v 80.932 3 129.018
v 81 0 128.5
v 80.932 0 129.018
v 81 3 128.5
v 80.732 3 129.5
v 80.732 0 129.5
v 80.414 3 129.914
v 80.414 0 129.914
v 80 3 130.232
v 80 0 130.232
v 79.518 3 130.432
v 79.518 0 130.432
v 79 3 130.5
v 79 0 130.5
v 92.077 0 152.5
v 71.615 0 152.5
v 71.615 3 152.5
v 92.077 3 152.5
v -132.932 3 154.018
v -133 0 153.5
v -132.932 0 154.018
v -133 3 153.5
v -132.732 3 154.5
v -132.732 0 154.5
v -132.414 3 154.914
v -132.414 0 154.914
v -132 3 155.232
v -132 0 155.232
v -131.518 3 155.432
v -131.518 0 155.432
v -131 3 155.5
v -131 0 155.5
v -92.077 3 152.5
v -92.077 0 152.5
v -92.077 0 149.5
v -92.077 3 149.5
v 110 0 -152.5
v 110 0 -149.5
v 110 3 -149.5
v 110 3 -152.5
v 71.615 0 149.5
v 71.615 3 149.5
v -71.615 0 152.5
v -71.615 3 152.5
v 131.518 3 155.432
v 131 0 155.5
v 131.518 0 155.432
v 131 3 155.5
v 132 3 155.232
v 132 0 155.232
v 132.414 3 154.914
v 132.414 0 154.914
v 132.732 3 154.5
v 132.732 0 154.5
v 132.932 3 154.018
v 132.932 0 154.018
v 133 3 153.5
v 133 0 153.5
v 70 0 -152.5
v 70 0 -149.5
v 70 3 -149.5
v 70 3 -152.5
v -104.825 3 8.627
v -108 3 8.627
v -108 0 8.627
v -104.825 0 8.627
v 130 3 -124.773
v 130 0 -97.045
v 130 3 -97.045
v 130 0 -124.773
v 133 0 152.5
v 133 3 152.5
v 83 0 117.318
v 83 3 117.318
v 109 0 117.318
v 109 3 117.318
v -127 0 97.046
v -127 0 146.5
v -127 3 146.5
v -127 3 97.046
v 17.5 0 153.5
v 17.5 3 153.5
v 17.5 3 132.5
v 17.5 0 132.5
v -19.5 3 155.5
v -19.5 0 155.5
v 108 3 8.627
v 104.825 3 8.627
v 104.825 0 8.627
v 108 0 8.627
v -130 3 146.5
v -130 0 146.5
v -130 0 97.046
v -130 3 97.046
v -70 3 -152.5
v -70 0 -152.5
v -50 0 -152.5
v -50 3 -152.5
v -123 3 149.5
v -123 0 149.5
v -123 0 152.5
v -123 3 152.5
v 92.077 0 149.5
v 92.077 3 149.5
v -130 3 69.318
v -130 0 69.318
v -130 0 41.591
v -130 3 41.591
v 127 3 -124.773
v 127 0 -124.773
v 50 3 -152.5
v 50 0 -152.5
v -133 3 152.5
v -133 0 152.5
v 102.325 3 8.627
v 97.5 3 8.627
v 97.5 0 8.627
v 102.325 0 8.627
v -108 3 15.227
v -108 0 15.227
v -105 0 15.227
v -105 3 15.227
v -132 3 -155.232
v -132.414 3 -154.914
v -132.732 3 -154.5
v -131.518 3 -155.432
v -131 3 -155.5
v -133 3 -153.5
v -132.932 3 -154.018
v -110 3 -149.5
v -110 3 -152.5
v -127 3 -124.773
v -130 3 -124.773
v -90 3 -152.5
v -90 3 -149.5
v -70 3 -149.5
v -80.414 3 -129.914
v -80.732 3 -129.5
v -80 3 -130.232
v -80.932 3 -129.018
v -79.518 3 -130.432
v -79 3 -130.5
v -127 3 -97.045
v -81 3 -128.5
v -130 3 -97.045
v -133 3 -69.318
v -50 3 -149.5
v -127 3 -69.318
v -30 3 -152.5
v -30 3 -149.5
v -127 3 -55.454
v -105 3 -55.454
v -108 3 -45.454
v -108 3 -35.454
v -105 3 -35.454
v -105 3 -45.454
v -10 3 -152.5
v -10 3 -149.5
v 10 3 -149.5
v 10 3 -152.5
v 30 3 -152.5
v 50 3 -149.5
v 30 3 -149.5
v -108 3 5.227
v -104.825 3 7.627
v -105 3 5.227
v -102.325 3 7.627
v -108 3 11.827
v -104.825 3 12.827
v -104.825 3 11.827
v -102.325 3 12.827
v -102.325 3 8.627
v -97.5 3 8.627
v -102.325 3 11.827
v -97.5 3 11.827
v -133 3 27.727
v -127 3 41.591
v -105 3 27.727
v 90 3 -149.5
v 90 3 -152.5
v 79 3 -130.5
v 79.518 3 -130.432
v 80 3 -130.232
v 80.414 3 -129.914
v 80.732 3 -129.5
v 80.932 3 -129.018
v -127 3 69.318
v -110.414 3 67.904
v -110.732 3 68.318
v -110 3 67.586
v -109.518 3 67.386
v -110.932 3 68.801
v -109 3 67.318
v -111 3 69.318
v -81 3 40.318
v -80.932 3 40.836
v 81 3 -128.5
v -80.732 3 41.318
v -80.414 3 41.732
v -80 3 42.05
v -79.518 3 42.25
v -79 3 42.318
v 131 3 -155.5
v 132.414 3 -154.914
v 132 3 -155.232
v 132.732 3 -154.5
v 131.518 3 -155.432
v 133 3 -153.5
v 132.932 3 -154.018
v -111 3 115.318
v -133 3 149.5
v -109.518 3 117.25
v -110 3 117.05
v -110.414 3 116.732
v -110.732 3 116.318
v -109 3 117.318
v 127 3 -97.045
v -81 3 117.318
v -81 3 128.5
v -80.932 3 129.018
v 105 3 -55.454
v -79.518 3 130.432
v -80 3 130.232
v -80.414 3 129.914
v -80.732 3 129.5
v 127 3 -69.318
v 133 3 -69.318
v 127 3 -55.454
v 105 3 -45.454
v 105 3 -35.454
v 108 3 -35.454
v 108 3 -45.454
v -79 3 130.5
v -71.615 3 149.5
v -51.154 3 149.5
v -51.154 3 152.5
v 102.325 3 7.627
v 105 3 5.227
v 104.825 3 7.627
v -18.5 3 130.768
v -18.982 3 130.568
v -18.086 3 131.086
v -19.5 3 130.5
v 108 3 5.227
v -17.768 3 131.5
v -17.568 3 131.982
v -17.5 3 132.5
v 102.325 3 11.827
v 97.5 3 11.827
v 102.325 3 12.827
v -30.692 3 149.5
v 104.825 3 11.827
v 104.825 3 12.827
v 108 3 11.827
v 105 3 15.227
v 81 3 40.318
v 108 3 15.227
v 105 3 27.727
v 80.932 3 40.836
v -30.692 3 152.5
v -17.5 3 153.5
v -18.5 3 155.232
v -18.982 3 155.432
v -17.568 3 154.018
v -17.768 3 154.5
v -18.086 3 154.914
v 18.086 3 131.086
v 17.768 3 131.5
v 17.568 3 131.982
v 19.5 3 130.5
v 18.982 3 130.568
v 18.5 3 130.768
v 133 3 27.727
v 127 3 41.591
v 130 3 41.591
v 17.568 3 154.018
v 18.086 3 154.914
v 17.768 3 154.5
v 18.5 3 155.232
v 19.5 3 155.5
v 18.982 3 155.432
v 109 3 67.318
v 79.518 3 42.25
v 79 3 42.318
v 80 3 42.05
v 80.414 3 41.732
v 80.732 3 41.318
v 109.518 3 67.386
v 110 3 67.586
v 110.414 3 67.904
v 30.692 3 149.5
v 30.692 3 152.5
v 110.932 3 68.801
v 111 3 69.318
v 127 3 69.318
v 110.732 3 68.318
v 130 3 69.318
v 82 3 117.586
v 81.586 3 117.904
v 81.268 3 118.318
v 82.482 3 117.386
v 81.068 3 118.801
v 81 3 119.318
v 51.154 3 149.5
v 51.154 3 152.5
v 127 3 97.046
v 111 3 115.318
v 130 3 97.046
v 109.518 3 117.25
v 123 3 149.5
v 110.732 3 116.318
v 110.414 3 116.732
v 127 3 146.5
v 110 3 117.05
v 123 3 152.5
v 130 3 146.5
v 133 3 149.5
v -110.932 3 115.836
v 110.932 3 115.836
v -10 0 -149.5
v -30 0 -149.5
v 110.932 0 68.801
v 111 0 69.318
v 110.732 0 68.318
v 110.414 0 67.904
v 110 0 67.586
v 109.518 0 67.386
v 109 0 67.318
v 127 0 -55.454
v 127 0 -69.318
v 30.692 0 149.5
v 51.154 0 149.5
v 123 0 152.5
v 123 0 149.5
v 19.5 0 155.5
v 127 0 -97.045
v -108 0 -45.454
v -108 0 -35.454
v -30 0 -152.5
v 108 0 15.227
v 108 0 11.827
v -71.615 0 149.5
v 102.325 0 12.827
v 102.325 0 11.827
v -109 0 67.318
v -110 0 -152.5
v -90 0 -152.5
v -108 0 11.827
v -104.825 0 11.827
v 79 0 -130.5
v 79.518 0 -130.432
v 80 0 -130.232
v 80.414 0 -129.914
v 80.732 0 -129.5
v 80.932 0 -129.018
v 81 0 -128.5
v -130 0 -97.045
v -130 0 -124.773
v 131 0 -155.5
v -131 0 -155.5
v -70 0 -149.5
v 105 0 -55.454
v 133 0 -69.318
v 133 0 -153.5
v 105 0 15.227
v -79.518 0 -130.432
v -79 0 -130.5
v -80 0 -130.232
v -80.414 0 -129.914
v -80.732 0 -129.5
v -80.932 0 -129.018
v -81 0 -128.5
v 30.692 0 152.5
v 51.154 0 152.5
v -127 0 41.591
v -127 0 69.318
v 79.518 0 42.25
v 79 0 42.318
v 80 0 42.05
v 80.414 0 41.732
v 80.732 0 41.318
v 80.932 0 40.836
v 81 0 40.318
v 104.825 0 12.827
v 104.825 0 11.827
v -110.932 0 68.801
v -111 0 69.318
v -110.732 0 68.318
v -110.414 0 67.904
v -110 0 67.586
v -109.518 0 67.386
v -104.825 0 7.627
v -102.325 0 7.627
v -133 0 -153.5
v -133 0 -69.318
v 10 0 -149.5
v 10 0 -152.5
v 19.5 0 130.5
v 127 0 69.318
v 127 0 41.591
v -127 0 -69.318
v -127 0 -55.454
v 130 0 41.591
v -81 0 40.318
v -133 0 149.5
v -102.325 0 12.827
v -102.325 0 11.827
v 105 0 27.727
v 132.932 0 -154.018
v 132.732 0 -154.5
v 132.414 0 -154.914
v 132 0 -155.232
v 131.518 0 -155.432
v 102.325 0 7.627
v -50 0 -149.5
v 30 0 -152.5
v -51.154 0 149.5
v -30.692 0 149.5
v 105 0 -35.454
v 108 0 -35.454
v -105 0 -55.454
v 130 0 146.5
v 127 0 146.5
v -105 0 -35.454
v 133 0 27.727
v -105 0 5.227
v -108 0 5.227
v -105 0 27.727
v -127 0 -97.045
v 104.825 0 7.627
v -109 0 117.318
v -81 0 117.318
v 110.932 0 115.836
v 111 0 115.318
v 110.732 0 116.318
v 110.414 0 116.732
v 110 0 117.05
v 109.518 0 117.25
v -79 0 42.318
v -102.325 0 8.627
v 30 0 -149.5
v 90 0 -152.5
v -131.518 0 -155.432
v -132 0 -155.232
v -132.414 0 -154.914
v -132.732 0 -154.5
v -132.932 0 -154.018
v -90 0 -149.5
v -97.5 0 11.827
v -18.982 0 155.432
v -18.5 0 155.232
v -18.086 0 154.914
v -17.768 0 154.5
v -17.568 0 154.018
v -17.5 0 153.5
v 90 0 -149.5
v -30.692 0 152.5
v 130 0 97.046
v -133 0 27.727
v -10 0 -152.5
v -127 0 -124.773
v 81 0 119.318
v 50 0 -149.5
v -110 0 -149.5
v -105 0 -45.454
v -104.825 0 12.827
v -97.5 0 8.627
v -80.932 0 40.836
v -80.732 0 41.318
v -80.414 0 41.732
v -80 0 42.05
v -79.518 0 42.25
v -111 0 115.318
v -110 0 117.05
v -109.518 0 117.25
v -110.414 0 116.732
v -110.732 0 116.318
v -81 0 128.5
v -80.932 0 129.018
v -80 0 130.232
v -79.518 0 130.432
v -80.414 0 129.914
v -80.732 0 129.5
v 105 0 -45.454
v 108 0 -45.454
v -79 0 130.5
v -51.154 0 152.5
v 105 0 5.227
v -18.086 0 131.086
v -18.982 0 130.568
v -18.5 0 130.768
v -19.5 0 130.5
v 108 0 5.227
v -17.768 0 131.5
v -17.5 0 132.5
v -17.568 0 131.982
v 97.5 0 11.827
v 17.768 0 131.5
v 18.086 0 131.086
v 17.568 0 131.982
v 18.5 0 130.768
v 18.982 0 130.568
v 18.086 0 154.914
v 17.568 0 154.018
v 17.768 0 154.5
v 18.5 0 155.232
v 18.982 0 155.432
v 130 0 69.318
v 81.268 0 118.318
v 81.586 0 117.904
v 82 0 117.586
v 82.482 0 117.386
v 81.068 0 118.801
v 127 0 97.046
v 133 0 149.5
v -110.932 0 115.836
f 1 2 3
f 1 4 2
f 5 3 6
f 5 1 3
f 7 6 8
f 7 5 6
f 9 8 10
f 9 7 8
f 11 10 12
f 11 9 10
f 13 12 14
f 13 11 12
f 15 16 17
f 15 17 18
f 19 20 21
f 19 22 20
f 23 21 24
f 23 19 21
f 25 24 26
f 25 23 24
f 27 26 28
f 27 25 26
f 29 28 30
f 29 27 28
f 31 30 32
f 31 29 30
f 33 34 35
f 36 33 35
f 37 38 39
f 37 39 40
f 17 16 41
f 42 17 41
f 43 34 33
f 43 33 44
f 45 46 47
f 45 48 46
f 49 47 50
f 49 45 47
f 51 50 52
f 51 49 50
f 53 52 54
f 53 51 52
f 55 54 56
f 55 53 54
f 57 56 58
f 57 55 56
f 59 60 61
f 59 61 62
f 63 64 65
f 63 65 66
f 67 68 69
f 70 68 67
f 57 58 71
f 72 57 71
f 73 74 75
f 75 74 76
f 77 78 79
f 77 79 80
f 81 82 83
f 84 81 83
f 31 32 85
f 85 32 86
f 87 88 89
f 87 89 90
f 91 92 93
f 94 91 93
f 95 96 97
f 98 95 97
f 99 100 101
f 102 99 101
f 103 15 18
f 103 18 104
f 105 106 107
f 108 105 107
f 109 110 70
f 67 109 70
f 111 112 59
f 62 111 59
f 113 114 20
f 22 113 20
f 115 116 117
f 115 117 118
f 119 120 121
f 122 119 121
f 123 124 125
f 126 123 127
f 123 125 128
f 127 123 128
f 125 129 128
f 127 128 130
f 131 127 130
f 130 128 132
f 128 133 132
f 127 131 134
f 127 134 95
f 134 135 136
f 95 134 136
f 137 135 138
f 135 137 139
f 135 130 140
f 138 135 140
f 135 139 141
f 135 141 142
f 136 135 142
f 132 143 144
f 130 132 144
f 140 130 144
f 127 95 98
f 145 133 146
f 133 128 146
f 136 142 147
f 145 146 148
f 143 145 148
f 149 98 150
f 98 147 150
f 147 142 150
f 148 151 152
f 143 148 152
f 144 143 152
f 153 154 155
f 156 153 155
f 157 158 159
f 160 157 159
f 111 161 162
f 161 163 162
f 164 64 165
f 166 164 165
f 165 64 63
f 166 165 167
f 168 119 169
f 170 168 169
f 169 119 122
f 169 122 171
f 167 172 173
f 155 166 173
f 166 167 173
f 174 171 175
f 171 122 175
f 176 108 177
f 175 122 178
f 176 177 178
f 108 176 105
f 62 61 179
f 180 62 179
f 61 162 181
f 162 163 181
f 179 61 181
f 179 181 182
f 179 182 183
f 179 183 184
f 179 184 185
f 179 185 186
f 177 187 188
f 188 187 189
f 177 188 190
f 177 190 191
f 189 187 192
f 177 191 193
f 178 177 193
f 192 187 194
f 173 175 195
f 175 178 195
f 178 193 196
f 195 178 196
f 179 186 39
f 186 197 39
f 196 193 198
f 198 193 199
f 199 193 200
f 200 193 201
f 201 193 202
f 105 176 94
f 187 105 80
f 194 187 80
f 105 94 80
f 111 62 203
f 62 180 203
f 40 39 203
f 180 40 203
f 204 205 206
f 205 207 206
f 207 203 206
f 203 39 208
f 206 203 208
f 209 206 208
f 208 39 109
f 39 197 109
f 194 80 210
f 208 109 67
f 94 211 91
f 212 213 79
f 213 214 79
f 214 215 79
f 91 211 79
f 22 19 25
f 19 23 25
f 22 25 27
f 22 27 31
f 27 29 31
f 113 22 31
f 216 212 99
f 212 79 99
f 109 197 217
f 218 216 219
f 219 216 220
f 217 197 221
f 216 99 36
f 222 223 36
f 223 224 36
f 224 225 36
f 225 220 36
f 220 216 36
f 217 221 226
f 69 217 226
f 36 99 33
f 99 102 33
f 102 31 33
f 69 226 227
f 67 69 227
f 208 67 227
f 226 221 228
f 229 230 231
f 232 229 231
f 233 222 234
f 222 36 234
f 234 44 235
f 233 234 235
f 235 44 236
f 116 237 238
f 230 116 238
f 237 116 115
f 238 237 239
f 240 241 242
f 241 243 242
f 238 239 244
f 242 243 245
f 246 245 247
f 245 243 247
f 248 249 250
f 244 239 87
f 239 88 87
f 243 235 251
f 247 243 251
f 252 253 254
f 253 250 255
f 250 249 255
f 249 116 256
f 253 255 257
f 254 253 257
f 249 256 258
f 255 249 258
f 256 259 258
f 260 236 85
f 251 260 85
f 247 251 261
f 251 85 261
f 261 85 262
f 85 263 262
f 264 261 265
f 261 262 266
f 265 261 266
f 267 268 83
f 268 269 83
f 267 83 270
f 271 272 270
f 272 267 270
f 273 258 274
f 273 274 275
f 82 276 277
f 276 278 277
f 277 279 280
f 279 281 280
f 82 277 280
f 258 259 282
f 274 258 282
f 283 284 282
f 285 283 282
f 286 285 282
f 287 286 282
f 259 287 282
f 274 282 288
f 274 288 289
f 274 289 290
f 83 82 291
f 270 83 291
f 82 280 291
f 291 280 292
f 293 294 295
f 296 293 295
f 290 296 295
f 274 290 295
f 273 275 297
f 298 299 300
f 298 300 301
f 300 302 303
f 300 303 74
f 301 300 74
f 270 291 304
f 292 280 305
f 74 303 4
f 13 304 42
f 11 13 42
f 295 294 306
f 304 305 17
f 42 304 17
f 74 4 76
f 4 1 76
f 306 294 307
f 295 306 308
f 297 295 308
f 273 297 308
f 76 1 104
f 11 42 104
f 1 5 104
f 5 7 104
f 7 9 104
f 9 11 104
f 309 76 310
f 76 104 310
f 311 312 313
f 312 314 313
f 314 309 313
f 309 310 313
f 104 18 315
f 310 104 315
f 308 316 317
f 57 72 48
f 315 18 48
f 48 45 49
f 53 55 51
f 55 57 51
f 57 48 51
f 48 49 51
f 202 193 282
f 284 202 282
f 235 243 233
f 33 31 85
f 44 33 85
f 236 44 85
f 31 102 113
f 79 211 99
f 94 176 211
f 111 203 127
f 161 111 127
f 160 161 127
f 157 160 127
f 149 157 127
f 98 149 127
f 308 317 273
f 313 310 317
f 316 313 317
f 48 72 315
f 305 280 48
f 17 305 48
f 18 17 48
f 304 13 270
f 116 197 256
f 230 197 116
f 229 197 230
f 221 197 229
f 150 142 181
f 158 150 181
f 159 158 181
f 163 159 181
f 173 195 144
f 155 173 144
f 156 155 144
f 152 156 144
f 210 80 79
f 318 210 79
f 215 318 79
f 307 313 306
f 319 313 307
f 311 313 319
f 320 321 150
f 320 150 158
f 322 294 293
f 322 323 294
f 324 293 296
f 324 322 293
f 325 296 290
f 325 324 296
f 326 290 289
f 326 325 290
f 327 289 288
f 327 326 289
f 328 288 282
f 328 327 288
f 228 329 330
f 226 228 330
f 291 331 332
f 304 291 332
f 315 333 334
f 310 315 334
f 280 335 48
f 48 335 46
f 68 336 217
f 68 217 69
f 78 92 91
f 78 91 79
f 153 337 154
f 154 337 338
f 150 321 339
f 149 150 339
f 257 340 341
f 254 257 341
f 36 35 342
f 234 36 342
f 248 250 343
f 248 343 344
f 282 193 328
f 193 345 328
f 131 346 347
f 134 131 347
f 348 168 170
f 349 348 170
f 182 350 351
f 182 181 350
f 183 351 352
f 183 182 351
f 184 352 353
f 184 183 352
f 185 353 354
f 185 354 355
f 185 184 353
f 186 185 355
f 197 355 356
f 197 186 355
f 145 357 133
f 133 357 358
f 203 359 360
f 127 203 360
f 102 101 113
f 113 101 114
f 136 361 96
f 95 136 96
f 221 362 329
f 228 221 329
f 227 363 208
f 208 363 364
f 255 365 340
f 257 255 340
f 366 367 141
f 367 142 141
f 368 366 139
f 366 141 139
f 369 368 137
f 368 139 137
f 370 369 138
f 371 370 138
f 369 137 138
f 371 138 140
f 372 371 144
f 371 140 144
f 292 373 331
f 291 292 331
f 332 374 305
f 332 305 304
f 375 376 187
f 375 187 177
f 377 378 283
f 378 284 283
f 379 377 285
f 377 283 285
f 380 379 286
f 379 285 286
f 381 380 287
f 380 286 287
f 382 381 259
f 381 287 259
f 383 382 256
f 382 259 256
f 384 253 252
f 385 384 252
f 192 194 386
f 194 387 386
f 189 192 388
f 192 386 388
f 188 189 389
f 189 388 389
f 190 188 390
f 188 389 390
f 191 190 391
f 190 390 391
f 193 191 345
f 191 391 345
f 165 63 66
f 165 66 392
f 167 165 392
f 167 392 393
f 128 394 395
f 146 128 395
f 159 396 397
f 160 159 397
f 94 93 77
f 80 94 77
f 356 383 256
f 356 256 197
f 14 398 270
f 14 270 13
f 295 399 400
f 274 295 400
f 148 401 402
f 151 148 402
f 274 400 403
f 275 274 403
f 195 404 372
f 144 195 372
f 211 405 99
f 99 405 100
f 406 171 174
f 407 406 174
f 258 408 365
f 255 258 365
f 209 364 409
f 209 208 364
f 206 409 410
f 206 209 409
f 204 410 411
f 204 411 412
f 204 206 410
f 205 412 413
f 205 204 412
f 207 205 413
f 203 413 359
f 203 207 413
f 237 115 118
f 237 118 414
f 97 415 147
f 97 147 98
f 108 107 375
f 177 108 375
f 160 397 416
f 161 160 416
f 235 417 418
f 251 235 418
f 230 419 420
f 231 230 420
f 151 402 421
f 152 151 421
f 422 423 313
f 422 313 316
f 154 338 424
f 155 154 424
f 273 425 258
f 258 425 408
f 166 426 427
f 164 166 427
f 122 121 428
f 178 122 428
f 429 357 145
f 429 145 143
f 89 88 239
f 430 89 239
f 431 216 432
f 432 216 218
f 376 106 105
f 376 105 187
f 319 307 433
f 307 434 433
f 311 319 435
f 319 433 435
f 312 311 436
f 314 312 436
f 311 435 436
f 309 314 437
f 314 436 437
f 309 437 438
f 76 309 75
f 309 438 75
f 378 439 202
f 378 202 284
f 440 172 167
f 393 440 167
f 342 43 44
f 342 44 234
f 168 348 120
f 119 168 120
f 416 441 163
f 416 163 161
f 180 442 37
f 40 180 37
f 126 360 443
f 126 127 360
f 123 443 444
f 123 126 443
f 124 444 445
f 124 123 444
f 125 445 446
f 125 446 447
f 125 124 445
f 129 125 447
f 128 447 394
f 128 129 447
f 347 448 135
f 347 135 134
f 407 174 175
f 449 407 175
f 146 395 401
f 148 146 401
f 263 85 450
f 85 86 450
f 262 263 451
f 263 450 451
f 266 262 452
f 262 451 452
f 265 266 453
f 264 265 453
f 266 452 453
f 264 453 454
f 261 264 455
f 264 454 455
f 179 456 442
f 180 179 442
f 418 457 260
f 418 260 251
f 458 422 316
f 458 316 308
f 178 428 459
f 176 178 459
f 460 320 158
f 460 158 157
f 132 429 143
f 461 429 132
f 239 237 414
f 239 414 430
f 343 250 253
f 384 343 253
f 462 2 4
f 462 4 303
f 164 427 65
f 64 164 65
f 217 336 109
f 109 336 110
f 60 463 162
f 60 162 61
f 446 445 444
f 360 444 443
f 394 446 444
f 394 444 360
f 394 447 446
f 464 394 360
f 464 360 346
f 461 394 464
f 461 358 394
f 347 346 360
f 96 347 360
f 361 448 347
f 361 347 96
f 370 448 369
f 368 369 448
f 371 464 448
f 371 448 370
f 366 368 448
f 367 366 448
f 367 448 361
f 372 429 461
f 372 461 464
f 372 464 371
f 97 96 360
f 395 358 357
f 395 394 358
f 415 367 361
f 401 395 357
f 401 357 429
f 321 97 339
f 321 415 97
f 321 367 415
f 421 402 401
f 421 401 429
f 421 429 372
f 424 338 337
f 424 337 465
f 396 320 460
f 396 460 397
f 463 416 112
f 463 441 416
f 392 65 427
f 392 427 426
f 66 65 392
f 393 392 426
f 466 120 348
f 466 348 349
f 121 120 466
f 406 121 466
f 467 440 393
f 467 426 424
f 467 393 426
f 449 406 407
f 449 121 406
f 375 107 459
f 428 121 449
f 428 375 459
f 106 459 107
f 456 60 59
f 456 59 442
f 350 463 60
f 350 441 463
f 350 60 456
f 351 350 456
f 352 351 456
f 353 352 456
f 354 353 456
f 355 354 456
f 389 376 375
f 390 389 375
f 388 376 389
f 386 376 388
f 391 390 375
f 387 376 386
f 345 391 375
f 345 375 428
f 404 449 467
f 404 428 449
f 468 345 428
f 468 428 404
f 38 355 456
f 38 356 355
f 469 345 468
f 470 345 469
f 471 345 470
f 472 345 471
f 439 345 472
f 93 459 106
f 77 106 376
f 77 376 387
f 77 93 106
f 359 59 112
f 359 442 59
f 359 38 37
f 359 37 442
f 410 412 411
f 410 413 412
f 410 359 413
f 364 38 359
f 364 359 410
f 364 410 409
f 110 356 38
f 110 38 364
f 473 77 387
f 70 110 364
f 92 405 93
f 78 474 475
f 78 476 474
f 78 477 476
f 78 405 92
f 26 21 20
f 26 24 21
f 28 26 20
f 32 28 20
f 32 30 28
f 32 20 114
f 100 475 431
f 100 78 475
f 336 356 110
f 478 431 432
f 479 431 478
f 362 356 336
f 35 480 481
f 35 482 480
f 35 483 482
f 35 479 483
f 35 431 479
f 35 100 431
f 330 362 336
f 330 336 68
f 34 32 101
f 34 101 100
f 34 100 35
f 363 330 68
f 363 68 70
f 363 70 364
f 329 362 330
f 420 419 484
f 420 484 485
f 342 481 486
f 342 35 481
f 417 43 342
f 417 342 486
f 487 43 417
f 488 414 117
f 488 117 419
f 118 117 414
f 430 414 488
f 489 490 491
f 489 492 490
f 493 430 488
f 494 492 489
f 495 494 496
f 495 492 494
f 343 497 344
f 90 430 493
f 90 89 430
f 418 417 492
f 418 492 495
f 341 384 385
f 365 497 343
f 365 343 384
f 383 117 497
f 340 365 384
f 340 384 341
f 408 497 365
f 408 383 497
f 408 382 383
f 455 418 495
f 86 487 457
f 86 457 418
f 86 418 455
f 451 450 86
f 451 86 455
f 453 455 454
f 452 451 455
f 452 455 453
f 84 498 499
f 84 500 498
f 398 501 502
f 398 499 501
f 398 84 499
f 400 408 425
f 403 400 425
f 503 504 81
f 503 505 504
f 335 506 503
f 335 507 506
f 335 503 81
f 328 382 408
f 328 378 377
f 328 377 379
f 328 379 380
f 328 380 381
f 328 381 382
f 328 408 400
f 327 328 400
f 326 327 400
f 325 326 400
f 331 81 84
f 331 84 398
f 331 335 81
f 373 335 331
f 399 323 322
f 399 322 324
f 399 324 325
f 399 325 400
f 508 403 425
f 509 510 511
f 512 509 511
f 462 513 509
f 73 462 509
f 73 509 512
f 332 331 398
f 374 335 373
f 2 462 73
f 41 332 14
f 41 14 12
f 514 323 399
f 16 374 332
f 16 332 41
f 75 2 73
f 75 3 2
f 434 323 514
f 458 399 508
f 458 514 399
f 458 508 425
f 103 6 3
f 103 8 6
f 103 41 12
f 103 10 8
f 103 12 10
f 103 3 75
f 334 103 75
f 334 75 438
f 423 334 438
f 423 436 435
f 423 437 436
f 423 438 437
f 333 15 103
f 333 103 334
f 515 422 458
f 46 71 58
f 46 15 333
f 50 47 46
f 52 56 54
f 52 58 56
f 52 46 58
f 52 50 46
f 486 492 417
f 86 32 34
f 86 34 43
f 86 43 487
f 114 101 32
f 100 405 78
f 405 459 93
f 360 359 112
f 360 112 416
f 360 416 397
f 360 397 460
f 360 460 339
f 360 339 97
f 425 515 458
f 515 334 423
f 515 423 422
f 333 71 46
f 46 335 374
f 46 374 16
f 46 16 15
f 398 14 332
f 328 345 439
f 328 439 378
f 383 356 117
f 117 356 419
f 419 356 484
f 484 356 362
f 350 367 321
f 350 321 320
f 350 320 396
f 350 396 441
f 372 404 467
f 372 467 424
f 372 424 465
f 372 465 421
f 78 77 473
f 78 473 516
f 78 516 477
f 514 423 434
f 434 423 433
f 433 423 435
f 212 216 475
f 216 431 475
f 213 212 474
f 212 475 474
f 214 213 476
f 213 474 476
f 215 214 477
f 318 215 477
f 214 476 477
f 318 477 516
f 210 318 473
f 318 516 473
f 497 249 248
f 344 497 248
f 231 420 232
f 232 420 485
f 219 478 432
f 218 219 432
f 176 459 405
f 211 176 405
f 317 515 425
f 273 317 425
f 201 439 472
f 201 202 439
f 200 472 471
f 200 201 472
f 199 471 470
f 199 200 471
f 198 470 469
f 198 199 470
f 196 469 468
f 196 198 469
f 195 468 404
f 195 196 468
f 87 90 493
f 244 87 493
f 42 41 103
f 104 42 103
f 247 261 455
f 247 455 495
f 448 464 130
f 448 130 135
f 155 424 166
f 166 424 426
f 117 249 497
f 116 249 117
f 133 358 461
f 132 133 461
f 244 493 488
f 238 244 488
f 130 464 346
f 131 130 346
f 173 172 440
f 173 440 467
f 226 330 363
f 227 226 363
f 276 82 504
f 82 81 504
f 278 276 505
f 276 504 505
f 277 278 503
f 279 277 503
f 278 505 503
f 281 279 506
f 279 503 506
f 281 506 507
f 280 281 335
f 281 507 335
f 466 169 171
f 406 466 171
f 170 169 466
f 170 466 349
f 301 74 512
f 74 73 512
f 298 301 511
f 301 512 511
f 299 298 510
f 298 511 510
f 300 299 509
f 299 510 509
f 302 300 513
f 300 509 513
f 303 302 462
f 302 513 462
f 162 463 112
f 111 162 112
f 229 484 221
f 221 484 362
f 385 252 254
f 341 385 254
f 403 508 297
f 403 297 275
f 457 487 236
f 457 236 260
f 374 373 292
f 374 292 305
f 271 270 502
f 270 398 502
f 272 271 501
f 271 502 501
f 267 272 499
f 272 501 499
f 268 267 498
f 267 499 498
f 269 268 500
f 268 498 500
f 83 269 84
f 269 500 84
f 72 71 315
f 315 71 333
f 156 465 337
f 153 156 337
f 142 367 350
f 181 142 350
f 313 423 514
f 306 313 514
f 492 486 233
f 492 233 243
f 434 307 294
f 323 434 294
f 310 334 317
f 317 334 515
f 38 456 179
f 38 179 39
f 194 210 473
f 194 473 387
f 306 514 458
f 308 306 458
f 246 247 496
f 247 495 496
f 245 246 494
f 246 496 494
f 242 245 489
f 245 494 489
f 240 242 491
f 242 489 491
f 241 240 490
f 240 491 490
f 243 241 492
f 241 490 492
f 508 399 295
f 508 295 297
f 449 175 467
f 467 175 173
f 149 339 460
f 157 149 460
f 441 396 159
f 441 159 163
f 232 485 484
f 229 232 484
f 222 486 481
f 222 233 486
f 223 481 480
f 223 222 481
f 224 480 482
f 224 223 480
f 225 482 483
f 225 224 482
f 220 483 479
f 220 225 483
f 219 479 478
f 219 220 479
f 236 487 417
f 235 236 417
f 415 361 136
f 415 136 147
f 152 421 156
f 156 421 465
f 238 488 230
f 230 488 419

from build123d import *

# Parameters (mm, degrees)
SKETCH1_W               = 3
SKETCH1_H               = 49.4545
SKETCH1_W_2             = 20.4615
SKETCH1_H_2             = 3
SKETCH1_H_3             = 27.7273
SKETCH1_W_3             = 162
SKETCH1_H_4             = 261
SKETCH1_W_4             = 20
BOSS_EXTRUDE1_DEPTH     = 3
SKETCH2_W               = 10.5
SKETCH2_H               = 3.2
SKETCH2_W_2             = 2.5
SKETCH2_H_2             = 5.2
CUT_EXTRUDE1_DEPTH      = 10
SKETCH3_W               = 35
SKETCH3_H               = 25
SKETCH3_W_2             = 30
SKETCH3_H_2             = 50
CUT_EXTRUDE2_DEPTH      = 1
CUT_EXTRUDE2_DEPTH_BACK = 4
SKETCH4_W               = 162
SKETCH4_H               = 25
BOSS_EXTRUDE2_DEPTH     = 3
FILLET1_R               = 2


with BuildPart() as part:
    # Sketch1 → Boss-Extrude1 (new body)
    with BuildSketch(Plane(origin=(0, 0, 0), x_dir=(1, 0, 0), z_dir=(0, 1, 0))):
        Polygon((-133, -152.5), (-133, -155.5), (133, -155.5), (133, -152.5), (123, -152.5), (123, -149.5), (133, -149.5), (133, -27.7273), (105, -27.7273), (105, -15.2273), (108, -15.2273), (108, -5.2273), (105, -5.2273), (105, 35.4545), (108, 35.4545), (108, 45.4545), (105, 45.4545), (105, 55.4545), (127, 55.4545), (127, 69.3181), (133, 69.3181), (133, 155.5), (-133, 155.5), (-133, 69.3181), (-127, 69.3181), (-127, 55.4545), (-105, 55.4545), (-105, 45.4545), (-108, 45.4545), (-108, 35.4545), (-105, 35.4545), (-105, -5.2273), (-108, -5.2273), (-108, -15.2273), (-105, -15.2273), (-105, -27.7273), (-133, -27.7273), (-133, -149.5), (-123, -149.5), (-123, -152.5), align=None)
        with Locations((-128.5, -121.77275)):
            Rectangle(SKETCH1_W, SKETCH1_H, mode=Mode.SUBTRACT)
        with Locations((-81.846, -151)):
            Rectangle(SKETCH1_W_2, SKETCH1_H_2, mode=Mode.SUBTRACT)
        with Locations((-40.923, -151)):
            Rectangle(SKETCH1_W_2, SKETCH1_H_2, mode=Mode.SUBTRACT)
        with Locations((0, -151)):
            Rectangle(SKETCH1_W_2, SKETCH1_H_2, mode=Mode.SUBTRACT)
        with Locations((-128.5, -55.45455)):
            Rectangle(SKETCH1_W, SKETCH1_H_3, mode=Mode.SUBTRACT)
        with Locations((40.923, -151)):
            Rectangle(SKETCH1_W_2, SKETCH1_H_2, mode=Mode.SUBTRACT)
        with Locations((81.846, -151)):
            Rectangle(SKETCH1_W_2, SKETCH1_H_2, mode=Mode.SUBTRACT)
        with Locations((128.5, -121.77275)):
            Rectangle(SKETCH1_W, SKETCH1_H, mode=Mode.SUBTRACT)
        with Locations((128.5, -55.45455)):
            Rectangle(SKETCH1_W, SKETCH1_H_3, mode=Mode.SUBTRACT)
        Rectangle(SKETCH1_W_3, SKETCH1_H_4, mode=Mode.SUBTRACT)
        with Locations((-128.5, 110.90905)):
            Rectangle(SKETCH1_W, SKETCH1_H_3, mode=Mode.SUBTRACT)
        with Locations((-100, 151)):
            Rectangle(SKETCH1_W_4, SKETCH1_H_2, mode=Mode.SUBTRACT)
        with Locations((-60, 151)):
            Rectangle(SKETCH1_W_4, SKETCH1_H_2, mode=Mode.SUBTRACT)
        with Locations((-20, 151)):
            Rectangle(SKETCH1_W_4, SKETCH1_H_2, mode=Mode.SUBTRACT)
        with Locations((20, 151)):
            Rectangle(SKETCH1_W_4, SKETCH1_H_2, mode=Mode.SUBTRACT)
        with Locations((60, 151)):
            Rectangle(SKETCH1_W_4, SKETCH1_H_2, mode=Mode.SUBTRACT)
        with Locations((128.5, 110.90905)):
            Rectangle(SKETCH1_W, SKETCH1_H_3, mode=Mode.SUBTRACT)
        with Locations((100, 151)):
            Rectangle(SKETCH1_W_4, SKETCH1_H_2, mode=Mode.SUBTRACT)
    extrude(amount=BOSS_EXTRUDE1_DEPTH)

    # Sketch2 → Cut-Extrude1 (cut)
    with BuildSketch(Plane(origin=(0, 3, 0), x_dir=(1, 0, 0), z_dir=(0, 1, 0))):
        with Locations((-102.75, -10.2273)):
            Rectangle(SKETCH2_W, SKETCH2_H)
        with Locations((102.75, -10.2273)):
            Rectangle(SKETCH2_W, SKETCH2_H)
        with Locations((103.575, -10.2273)):
            Rectangle(SKETCH2_W_2, SKETCH2_H_2)
        with Locations((-103.575, -10.2273)):
            Rectangle(SKETCH2_W_2, SKETCH2_H_2)
    extrude(amount=-CUT_EXTRUDE1_DEPTH, mode=Mode.SUBTRACT)

    # Sketch3 → Cut-Extrude2 (cut, two sides)
    with BuildSketch(Plane(origin=(0, 3, 0), x_dir=(1, 0, 0), z_dir=(0, 1, 0))) as cut_extrude2_sk:
        with Locations((0, -143)):
            Rectangle(SKETCH3_W, SKETCH3_H)
        with Locations((-96, -92.3182)):
            Rectangle(SKETCH3_W_2, SKETCH3_H_2)
        with Locations((96, -92.3182)):
            Rectangle(SKETCH3_W_2, SKETCH3_H_2)
    extrude(amount=CUT_EXTRUDE2_DEPTH, mode=Mode.SUBTRACT)
    extrude(cut_extrude2_sk.sketch, amount=-CUT_EXTRUDE2_DEPTH_BACK, mode=Mode.SUBTRACT)

    # Sketch4 → Boss-Extrude2 (add)
    with BuildSketch(Plane.XZ):
        with Locations((0, 54.8182)):
            Rectangle(SKETCH4_W, SKETCH4_H)
    extrude(amount=-BOSS_EXTRUDE2_DEPTH)

    # Fillet1
    fillet1_edges = [part.edges().sort_by_distance(p)[0] for p in [
        (-133, 1.5, -155.5),
        (133, 1.5, -155.5),
        (133, 1.5, 155.5),
        (-133, 1.5, 155.5),
        (81, 1.5, -130.5),
        (-81, 1.5, -130.5),
        (-81, 1.5, 130.5),
        (81, 1.5, 130.5),
        (17.5, 1.5, 130.5),
        (17.5, 1.5, 155.5),
        (-17.5, 1.5, 155.5),
        (-17.5, 1.5, 130.5),
        (-111, 1.5, 117.3182),
        (-111, 1.5, 67.3182),
        (81, 1.5, 117.3182),
        (111, 1.5, 67.3182),
        (111, 1.5, 117.3182),
        (-81, 1.5, 42.3182),
        (81, 1.5, 42.3182),
    ]]
    fillet(fillet1_edges, radius=FILLET1_R)


solid = part.part
